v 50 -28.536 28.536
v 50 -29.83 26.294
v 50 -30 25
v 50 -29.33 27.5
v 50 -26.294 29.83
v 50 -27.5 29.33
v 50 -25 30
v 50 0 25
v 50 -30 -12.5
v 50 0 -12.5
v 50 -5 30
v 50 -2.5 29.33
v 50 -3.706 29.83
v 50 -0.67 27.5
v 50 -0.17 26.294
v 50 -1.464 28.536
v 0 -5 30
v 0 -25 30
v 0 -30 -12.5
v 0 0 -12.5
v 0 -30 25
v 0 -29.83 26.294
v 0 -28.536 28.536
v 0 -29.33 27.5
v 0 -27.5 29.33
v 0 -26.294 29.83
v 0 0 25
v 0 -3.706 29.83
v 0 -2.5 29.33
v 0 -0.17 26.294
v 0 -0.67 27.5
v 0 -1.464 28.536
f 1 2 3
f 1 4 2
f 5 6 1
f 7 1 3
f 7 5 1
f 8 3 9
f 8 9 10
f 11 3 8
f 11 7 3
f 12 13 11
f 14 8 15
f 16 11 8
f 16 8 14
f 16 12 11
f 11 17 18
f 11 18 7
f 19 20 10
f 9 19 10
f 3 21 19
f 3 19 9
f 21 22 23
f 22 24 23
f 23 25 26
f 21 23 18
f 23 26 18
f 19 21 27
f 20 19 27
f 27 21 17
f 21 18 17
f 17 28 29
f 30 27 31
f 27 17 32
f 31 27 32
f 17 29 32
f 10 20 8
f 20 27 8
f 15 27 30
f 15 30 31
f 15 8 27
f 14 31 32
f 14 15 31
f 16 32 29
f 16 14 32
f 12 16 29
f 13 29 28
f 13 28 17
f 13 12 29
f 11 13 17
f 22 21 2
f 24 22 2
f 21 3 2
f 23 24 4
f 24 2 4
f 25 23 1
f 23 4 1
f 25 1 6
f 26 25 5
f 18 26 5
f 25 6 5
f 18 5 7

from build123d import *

# Parameters (mm, degrees)
F0_W     = 50
F0_H     = 30
F1_DEPTH = 30
F2_R     = 5
F3_DEPTH = 12.5


with BuildPart() as f1:
    # F0 (on Top) → F1 (new body)
    with BuildSketch(Plane.XY):
        with Locations((25, -15)):
            Rectangle(F0_W, F0_H)
    extrude(amount=F1_DEPTH)

    # F2
    f2_edges = [f1.edges().sort_by_distance(p)[0] for p in [
        (25, -30, 0),
        (25, 0, 0),
        (25, 0, 30),
        (25, -30, 30),
    ]]
    fillet(f2_edges, radius=F2_R)

    # F0 (on Top) → F3 (join, symmetric)
    with BuildSketch(Plane.XY):
        with Locations((25, -15)):
            Rectangle(F0_W, F0_H)
    extrude(amount=F3_DEPTH, both=True)


solid = f1.part
